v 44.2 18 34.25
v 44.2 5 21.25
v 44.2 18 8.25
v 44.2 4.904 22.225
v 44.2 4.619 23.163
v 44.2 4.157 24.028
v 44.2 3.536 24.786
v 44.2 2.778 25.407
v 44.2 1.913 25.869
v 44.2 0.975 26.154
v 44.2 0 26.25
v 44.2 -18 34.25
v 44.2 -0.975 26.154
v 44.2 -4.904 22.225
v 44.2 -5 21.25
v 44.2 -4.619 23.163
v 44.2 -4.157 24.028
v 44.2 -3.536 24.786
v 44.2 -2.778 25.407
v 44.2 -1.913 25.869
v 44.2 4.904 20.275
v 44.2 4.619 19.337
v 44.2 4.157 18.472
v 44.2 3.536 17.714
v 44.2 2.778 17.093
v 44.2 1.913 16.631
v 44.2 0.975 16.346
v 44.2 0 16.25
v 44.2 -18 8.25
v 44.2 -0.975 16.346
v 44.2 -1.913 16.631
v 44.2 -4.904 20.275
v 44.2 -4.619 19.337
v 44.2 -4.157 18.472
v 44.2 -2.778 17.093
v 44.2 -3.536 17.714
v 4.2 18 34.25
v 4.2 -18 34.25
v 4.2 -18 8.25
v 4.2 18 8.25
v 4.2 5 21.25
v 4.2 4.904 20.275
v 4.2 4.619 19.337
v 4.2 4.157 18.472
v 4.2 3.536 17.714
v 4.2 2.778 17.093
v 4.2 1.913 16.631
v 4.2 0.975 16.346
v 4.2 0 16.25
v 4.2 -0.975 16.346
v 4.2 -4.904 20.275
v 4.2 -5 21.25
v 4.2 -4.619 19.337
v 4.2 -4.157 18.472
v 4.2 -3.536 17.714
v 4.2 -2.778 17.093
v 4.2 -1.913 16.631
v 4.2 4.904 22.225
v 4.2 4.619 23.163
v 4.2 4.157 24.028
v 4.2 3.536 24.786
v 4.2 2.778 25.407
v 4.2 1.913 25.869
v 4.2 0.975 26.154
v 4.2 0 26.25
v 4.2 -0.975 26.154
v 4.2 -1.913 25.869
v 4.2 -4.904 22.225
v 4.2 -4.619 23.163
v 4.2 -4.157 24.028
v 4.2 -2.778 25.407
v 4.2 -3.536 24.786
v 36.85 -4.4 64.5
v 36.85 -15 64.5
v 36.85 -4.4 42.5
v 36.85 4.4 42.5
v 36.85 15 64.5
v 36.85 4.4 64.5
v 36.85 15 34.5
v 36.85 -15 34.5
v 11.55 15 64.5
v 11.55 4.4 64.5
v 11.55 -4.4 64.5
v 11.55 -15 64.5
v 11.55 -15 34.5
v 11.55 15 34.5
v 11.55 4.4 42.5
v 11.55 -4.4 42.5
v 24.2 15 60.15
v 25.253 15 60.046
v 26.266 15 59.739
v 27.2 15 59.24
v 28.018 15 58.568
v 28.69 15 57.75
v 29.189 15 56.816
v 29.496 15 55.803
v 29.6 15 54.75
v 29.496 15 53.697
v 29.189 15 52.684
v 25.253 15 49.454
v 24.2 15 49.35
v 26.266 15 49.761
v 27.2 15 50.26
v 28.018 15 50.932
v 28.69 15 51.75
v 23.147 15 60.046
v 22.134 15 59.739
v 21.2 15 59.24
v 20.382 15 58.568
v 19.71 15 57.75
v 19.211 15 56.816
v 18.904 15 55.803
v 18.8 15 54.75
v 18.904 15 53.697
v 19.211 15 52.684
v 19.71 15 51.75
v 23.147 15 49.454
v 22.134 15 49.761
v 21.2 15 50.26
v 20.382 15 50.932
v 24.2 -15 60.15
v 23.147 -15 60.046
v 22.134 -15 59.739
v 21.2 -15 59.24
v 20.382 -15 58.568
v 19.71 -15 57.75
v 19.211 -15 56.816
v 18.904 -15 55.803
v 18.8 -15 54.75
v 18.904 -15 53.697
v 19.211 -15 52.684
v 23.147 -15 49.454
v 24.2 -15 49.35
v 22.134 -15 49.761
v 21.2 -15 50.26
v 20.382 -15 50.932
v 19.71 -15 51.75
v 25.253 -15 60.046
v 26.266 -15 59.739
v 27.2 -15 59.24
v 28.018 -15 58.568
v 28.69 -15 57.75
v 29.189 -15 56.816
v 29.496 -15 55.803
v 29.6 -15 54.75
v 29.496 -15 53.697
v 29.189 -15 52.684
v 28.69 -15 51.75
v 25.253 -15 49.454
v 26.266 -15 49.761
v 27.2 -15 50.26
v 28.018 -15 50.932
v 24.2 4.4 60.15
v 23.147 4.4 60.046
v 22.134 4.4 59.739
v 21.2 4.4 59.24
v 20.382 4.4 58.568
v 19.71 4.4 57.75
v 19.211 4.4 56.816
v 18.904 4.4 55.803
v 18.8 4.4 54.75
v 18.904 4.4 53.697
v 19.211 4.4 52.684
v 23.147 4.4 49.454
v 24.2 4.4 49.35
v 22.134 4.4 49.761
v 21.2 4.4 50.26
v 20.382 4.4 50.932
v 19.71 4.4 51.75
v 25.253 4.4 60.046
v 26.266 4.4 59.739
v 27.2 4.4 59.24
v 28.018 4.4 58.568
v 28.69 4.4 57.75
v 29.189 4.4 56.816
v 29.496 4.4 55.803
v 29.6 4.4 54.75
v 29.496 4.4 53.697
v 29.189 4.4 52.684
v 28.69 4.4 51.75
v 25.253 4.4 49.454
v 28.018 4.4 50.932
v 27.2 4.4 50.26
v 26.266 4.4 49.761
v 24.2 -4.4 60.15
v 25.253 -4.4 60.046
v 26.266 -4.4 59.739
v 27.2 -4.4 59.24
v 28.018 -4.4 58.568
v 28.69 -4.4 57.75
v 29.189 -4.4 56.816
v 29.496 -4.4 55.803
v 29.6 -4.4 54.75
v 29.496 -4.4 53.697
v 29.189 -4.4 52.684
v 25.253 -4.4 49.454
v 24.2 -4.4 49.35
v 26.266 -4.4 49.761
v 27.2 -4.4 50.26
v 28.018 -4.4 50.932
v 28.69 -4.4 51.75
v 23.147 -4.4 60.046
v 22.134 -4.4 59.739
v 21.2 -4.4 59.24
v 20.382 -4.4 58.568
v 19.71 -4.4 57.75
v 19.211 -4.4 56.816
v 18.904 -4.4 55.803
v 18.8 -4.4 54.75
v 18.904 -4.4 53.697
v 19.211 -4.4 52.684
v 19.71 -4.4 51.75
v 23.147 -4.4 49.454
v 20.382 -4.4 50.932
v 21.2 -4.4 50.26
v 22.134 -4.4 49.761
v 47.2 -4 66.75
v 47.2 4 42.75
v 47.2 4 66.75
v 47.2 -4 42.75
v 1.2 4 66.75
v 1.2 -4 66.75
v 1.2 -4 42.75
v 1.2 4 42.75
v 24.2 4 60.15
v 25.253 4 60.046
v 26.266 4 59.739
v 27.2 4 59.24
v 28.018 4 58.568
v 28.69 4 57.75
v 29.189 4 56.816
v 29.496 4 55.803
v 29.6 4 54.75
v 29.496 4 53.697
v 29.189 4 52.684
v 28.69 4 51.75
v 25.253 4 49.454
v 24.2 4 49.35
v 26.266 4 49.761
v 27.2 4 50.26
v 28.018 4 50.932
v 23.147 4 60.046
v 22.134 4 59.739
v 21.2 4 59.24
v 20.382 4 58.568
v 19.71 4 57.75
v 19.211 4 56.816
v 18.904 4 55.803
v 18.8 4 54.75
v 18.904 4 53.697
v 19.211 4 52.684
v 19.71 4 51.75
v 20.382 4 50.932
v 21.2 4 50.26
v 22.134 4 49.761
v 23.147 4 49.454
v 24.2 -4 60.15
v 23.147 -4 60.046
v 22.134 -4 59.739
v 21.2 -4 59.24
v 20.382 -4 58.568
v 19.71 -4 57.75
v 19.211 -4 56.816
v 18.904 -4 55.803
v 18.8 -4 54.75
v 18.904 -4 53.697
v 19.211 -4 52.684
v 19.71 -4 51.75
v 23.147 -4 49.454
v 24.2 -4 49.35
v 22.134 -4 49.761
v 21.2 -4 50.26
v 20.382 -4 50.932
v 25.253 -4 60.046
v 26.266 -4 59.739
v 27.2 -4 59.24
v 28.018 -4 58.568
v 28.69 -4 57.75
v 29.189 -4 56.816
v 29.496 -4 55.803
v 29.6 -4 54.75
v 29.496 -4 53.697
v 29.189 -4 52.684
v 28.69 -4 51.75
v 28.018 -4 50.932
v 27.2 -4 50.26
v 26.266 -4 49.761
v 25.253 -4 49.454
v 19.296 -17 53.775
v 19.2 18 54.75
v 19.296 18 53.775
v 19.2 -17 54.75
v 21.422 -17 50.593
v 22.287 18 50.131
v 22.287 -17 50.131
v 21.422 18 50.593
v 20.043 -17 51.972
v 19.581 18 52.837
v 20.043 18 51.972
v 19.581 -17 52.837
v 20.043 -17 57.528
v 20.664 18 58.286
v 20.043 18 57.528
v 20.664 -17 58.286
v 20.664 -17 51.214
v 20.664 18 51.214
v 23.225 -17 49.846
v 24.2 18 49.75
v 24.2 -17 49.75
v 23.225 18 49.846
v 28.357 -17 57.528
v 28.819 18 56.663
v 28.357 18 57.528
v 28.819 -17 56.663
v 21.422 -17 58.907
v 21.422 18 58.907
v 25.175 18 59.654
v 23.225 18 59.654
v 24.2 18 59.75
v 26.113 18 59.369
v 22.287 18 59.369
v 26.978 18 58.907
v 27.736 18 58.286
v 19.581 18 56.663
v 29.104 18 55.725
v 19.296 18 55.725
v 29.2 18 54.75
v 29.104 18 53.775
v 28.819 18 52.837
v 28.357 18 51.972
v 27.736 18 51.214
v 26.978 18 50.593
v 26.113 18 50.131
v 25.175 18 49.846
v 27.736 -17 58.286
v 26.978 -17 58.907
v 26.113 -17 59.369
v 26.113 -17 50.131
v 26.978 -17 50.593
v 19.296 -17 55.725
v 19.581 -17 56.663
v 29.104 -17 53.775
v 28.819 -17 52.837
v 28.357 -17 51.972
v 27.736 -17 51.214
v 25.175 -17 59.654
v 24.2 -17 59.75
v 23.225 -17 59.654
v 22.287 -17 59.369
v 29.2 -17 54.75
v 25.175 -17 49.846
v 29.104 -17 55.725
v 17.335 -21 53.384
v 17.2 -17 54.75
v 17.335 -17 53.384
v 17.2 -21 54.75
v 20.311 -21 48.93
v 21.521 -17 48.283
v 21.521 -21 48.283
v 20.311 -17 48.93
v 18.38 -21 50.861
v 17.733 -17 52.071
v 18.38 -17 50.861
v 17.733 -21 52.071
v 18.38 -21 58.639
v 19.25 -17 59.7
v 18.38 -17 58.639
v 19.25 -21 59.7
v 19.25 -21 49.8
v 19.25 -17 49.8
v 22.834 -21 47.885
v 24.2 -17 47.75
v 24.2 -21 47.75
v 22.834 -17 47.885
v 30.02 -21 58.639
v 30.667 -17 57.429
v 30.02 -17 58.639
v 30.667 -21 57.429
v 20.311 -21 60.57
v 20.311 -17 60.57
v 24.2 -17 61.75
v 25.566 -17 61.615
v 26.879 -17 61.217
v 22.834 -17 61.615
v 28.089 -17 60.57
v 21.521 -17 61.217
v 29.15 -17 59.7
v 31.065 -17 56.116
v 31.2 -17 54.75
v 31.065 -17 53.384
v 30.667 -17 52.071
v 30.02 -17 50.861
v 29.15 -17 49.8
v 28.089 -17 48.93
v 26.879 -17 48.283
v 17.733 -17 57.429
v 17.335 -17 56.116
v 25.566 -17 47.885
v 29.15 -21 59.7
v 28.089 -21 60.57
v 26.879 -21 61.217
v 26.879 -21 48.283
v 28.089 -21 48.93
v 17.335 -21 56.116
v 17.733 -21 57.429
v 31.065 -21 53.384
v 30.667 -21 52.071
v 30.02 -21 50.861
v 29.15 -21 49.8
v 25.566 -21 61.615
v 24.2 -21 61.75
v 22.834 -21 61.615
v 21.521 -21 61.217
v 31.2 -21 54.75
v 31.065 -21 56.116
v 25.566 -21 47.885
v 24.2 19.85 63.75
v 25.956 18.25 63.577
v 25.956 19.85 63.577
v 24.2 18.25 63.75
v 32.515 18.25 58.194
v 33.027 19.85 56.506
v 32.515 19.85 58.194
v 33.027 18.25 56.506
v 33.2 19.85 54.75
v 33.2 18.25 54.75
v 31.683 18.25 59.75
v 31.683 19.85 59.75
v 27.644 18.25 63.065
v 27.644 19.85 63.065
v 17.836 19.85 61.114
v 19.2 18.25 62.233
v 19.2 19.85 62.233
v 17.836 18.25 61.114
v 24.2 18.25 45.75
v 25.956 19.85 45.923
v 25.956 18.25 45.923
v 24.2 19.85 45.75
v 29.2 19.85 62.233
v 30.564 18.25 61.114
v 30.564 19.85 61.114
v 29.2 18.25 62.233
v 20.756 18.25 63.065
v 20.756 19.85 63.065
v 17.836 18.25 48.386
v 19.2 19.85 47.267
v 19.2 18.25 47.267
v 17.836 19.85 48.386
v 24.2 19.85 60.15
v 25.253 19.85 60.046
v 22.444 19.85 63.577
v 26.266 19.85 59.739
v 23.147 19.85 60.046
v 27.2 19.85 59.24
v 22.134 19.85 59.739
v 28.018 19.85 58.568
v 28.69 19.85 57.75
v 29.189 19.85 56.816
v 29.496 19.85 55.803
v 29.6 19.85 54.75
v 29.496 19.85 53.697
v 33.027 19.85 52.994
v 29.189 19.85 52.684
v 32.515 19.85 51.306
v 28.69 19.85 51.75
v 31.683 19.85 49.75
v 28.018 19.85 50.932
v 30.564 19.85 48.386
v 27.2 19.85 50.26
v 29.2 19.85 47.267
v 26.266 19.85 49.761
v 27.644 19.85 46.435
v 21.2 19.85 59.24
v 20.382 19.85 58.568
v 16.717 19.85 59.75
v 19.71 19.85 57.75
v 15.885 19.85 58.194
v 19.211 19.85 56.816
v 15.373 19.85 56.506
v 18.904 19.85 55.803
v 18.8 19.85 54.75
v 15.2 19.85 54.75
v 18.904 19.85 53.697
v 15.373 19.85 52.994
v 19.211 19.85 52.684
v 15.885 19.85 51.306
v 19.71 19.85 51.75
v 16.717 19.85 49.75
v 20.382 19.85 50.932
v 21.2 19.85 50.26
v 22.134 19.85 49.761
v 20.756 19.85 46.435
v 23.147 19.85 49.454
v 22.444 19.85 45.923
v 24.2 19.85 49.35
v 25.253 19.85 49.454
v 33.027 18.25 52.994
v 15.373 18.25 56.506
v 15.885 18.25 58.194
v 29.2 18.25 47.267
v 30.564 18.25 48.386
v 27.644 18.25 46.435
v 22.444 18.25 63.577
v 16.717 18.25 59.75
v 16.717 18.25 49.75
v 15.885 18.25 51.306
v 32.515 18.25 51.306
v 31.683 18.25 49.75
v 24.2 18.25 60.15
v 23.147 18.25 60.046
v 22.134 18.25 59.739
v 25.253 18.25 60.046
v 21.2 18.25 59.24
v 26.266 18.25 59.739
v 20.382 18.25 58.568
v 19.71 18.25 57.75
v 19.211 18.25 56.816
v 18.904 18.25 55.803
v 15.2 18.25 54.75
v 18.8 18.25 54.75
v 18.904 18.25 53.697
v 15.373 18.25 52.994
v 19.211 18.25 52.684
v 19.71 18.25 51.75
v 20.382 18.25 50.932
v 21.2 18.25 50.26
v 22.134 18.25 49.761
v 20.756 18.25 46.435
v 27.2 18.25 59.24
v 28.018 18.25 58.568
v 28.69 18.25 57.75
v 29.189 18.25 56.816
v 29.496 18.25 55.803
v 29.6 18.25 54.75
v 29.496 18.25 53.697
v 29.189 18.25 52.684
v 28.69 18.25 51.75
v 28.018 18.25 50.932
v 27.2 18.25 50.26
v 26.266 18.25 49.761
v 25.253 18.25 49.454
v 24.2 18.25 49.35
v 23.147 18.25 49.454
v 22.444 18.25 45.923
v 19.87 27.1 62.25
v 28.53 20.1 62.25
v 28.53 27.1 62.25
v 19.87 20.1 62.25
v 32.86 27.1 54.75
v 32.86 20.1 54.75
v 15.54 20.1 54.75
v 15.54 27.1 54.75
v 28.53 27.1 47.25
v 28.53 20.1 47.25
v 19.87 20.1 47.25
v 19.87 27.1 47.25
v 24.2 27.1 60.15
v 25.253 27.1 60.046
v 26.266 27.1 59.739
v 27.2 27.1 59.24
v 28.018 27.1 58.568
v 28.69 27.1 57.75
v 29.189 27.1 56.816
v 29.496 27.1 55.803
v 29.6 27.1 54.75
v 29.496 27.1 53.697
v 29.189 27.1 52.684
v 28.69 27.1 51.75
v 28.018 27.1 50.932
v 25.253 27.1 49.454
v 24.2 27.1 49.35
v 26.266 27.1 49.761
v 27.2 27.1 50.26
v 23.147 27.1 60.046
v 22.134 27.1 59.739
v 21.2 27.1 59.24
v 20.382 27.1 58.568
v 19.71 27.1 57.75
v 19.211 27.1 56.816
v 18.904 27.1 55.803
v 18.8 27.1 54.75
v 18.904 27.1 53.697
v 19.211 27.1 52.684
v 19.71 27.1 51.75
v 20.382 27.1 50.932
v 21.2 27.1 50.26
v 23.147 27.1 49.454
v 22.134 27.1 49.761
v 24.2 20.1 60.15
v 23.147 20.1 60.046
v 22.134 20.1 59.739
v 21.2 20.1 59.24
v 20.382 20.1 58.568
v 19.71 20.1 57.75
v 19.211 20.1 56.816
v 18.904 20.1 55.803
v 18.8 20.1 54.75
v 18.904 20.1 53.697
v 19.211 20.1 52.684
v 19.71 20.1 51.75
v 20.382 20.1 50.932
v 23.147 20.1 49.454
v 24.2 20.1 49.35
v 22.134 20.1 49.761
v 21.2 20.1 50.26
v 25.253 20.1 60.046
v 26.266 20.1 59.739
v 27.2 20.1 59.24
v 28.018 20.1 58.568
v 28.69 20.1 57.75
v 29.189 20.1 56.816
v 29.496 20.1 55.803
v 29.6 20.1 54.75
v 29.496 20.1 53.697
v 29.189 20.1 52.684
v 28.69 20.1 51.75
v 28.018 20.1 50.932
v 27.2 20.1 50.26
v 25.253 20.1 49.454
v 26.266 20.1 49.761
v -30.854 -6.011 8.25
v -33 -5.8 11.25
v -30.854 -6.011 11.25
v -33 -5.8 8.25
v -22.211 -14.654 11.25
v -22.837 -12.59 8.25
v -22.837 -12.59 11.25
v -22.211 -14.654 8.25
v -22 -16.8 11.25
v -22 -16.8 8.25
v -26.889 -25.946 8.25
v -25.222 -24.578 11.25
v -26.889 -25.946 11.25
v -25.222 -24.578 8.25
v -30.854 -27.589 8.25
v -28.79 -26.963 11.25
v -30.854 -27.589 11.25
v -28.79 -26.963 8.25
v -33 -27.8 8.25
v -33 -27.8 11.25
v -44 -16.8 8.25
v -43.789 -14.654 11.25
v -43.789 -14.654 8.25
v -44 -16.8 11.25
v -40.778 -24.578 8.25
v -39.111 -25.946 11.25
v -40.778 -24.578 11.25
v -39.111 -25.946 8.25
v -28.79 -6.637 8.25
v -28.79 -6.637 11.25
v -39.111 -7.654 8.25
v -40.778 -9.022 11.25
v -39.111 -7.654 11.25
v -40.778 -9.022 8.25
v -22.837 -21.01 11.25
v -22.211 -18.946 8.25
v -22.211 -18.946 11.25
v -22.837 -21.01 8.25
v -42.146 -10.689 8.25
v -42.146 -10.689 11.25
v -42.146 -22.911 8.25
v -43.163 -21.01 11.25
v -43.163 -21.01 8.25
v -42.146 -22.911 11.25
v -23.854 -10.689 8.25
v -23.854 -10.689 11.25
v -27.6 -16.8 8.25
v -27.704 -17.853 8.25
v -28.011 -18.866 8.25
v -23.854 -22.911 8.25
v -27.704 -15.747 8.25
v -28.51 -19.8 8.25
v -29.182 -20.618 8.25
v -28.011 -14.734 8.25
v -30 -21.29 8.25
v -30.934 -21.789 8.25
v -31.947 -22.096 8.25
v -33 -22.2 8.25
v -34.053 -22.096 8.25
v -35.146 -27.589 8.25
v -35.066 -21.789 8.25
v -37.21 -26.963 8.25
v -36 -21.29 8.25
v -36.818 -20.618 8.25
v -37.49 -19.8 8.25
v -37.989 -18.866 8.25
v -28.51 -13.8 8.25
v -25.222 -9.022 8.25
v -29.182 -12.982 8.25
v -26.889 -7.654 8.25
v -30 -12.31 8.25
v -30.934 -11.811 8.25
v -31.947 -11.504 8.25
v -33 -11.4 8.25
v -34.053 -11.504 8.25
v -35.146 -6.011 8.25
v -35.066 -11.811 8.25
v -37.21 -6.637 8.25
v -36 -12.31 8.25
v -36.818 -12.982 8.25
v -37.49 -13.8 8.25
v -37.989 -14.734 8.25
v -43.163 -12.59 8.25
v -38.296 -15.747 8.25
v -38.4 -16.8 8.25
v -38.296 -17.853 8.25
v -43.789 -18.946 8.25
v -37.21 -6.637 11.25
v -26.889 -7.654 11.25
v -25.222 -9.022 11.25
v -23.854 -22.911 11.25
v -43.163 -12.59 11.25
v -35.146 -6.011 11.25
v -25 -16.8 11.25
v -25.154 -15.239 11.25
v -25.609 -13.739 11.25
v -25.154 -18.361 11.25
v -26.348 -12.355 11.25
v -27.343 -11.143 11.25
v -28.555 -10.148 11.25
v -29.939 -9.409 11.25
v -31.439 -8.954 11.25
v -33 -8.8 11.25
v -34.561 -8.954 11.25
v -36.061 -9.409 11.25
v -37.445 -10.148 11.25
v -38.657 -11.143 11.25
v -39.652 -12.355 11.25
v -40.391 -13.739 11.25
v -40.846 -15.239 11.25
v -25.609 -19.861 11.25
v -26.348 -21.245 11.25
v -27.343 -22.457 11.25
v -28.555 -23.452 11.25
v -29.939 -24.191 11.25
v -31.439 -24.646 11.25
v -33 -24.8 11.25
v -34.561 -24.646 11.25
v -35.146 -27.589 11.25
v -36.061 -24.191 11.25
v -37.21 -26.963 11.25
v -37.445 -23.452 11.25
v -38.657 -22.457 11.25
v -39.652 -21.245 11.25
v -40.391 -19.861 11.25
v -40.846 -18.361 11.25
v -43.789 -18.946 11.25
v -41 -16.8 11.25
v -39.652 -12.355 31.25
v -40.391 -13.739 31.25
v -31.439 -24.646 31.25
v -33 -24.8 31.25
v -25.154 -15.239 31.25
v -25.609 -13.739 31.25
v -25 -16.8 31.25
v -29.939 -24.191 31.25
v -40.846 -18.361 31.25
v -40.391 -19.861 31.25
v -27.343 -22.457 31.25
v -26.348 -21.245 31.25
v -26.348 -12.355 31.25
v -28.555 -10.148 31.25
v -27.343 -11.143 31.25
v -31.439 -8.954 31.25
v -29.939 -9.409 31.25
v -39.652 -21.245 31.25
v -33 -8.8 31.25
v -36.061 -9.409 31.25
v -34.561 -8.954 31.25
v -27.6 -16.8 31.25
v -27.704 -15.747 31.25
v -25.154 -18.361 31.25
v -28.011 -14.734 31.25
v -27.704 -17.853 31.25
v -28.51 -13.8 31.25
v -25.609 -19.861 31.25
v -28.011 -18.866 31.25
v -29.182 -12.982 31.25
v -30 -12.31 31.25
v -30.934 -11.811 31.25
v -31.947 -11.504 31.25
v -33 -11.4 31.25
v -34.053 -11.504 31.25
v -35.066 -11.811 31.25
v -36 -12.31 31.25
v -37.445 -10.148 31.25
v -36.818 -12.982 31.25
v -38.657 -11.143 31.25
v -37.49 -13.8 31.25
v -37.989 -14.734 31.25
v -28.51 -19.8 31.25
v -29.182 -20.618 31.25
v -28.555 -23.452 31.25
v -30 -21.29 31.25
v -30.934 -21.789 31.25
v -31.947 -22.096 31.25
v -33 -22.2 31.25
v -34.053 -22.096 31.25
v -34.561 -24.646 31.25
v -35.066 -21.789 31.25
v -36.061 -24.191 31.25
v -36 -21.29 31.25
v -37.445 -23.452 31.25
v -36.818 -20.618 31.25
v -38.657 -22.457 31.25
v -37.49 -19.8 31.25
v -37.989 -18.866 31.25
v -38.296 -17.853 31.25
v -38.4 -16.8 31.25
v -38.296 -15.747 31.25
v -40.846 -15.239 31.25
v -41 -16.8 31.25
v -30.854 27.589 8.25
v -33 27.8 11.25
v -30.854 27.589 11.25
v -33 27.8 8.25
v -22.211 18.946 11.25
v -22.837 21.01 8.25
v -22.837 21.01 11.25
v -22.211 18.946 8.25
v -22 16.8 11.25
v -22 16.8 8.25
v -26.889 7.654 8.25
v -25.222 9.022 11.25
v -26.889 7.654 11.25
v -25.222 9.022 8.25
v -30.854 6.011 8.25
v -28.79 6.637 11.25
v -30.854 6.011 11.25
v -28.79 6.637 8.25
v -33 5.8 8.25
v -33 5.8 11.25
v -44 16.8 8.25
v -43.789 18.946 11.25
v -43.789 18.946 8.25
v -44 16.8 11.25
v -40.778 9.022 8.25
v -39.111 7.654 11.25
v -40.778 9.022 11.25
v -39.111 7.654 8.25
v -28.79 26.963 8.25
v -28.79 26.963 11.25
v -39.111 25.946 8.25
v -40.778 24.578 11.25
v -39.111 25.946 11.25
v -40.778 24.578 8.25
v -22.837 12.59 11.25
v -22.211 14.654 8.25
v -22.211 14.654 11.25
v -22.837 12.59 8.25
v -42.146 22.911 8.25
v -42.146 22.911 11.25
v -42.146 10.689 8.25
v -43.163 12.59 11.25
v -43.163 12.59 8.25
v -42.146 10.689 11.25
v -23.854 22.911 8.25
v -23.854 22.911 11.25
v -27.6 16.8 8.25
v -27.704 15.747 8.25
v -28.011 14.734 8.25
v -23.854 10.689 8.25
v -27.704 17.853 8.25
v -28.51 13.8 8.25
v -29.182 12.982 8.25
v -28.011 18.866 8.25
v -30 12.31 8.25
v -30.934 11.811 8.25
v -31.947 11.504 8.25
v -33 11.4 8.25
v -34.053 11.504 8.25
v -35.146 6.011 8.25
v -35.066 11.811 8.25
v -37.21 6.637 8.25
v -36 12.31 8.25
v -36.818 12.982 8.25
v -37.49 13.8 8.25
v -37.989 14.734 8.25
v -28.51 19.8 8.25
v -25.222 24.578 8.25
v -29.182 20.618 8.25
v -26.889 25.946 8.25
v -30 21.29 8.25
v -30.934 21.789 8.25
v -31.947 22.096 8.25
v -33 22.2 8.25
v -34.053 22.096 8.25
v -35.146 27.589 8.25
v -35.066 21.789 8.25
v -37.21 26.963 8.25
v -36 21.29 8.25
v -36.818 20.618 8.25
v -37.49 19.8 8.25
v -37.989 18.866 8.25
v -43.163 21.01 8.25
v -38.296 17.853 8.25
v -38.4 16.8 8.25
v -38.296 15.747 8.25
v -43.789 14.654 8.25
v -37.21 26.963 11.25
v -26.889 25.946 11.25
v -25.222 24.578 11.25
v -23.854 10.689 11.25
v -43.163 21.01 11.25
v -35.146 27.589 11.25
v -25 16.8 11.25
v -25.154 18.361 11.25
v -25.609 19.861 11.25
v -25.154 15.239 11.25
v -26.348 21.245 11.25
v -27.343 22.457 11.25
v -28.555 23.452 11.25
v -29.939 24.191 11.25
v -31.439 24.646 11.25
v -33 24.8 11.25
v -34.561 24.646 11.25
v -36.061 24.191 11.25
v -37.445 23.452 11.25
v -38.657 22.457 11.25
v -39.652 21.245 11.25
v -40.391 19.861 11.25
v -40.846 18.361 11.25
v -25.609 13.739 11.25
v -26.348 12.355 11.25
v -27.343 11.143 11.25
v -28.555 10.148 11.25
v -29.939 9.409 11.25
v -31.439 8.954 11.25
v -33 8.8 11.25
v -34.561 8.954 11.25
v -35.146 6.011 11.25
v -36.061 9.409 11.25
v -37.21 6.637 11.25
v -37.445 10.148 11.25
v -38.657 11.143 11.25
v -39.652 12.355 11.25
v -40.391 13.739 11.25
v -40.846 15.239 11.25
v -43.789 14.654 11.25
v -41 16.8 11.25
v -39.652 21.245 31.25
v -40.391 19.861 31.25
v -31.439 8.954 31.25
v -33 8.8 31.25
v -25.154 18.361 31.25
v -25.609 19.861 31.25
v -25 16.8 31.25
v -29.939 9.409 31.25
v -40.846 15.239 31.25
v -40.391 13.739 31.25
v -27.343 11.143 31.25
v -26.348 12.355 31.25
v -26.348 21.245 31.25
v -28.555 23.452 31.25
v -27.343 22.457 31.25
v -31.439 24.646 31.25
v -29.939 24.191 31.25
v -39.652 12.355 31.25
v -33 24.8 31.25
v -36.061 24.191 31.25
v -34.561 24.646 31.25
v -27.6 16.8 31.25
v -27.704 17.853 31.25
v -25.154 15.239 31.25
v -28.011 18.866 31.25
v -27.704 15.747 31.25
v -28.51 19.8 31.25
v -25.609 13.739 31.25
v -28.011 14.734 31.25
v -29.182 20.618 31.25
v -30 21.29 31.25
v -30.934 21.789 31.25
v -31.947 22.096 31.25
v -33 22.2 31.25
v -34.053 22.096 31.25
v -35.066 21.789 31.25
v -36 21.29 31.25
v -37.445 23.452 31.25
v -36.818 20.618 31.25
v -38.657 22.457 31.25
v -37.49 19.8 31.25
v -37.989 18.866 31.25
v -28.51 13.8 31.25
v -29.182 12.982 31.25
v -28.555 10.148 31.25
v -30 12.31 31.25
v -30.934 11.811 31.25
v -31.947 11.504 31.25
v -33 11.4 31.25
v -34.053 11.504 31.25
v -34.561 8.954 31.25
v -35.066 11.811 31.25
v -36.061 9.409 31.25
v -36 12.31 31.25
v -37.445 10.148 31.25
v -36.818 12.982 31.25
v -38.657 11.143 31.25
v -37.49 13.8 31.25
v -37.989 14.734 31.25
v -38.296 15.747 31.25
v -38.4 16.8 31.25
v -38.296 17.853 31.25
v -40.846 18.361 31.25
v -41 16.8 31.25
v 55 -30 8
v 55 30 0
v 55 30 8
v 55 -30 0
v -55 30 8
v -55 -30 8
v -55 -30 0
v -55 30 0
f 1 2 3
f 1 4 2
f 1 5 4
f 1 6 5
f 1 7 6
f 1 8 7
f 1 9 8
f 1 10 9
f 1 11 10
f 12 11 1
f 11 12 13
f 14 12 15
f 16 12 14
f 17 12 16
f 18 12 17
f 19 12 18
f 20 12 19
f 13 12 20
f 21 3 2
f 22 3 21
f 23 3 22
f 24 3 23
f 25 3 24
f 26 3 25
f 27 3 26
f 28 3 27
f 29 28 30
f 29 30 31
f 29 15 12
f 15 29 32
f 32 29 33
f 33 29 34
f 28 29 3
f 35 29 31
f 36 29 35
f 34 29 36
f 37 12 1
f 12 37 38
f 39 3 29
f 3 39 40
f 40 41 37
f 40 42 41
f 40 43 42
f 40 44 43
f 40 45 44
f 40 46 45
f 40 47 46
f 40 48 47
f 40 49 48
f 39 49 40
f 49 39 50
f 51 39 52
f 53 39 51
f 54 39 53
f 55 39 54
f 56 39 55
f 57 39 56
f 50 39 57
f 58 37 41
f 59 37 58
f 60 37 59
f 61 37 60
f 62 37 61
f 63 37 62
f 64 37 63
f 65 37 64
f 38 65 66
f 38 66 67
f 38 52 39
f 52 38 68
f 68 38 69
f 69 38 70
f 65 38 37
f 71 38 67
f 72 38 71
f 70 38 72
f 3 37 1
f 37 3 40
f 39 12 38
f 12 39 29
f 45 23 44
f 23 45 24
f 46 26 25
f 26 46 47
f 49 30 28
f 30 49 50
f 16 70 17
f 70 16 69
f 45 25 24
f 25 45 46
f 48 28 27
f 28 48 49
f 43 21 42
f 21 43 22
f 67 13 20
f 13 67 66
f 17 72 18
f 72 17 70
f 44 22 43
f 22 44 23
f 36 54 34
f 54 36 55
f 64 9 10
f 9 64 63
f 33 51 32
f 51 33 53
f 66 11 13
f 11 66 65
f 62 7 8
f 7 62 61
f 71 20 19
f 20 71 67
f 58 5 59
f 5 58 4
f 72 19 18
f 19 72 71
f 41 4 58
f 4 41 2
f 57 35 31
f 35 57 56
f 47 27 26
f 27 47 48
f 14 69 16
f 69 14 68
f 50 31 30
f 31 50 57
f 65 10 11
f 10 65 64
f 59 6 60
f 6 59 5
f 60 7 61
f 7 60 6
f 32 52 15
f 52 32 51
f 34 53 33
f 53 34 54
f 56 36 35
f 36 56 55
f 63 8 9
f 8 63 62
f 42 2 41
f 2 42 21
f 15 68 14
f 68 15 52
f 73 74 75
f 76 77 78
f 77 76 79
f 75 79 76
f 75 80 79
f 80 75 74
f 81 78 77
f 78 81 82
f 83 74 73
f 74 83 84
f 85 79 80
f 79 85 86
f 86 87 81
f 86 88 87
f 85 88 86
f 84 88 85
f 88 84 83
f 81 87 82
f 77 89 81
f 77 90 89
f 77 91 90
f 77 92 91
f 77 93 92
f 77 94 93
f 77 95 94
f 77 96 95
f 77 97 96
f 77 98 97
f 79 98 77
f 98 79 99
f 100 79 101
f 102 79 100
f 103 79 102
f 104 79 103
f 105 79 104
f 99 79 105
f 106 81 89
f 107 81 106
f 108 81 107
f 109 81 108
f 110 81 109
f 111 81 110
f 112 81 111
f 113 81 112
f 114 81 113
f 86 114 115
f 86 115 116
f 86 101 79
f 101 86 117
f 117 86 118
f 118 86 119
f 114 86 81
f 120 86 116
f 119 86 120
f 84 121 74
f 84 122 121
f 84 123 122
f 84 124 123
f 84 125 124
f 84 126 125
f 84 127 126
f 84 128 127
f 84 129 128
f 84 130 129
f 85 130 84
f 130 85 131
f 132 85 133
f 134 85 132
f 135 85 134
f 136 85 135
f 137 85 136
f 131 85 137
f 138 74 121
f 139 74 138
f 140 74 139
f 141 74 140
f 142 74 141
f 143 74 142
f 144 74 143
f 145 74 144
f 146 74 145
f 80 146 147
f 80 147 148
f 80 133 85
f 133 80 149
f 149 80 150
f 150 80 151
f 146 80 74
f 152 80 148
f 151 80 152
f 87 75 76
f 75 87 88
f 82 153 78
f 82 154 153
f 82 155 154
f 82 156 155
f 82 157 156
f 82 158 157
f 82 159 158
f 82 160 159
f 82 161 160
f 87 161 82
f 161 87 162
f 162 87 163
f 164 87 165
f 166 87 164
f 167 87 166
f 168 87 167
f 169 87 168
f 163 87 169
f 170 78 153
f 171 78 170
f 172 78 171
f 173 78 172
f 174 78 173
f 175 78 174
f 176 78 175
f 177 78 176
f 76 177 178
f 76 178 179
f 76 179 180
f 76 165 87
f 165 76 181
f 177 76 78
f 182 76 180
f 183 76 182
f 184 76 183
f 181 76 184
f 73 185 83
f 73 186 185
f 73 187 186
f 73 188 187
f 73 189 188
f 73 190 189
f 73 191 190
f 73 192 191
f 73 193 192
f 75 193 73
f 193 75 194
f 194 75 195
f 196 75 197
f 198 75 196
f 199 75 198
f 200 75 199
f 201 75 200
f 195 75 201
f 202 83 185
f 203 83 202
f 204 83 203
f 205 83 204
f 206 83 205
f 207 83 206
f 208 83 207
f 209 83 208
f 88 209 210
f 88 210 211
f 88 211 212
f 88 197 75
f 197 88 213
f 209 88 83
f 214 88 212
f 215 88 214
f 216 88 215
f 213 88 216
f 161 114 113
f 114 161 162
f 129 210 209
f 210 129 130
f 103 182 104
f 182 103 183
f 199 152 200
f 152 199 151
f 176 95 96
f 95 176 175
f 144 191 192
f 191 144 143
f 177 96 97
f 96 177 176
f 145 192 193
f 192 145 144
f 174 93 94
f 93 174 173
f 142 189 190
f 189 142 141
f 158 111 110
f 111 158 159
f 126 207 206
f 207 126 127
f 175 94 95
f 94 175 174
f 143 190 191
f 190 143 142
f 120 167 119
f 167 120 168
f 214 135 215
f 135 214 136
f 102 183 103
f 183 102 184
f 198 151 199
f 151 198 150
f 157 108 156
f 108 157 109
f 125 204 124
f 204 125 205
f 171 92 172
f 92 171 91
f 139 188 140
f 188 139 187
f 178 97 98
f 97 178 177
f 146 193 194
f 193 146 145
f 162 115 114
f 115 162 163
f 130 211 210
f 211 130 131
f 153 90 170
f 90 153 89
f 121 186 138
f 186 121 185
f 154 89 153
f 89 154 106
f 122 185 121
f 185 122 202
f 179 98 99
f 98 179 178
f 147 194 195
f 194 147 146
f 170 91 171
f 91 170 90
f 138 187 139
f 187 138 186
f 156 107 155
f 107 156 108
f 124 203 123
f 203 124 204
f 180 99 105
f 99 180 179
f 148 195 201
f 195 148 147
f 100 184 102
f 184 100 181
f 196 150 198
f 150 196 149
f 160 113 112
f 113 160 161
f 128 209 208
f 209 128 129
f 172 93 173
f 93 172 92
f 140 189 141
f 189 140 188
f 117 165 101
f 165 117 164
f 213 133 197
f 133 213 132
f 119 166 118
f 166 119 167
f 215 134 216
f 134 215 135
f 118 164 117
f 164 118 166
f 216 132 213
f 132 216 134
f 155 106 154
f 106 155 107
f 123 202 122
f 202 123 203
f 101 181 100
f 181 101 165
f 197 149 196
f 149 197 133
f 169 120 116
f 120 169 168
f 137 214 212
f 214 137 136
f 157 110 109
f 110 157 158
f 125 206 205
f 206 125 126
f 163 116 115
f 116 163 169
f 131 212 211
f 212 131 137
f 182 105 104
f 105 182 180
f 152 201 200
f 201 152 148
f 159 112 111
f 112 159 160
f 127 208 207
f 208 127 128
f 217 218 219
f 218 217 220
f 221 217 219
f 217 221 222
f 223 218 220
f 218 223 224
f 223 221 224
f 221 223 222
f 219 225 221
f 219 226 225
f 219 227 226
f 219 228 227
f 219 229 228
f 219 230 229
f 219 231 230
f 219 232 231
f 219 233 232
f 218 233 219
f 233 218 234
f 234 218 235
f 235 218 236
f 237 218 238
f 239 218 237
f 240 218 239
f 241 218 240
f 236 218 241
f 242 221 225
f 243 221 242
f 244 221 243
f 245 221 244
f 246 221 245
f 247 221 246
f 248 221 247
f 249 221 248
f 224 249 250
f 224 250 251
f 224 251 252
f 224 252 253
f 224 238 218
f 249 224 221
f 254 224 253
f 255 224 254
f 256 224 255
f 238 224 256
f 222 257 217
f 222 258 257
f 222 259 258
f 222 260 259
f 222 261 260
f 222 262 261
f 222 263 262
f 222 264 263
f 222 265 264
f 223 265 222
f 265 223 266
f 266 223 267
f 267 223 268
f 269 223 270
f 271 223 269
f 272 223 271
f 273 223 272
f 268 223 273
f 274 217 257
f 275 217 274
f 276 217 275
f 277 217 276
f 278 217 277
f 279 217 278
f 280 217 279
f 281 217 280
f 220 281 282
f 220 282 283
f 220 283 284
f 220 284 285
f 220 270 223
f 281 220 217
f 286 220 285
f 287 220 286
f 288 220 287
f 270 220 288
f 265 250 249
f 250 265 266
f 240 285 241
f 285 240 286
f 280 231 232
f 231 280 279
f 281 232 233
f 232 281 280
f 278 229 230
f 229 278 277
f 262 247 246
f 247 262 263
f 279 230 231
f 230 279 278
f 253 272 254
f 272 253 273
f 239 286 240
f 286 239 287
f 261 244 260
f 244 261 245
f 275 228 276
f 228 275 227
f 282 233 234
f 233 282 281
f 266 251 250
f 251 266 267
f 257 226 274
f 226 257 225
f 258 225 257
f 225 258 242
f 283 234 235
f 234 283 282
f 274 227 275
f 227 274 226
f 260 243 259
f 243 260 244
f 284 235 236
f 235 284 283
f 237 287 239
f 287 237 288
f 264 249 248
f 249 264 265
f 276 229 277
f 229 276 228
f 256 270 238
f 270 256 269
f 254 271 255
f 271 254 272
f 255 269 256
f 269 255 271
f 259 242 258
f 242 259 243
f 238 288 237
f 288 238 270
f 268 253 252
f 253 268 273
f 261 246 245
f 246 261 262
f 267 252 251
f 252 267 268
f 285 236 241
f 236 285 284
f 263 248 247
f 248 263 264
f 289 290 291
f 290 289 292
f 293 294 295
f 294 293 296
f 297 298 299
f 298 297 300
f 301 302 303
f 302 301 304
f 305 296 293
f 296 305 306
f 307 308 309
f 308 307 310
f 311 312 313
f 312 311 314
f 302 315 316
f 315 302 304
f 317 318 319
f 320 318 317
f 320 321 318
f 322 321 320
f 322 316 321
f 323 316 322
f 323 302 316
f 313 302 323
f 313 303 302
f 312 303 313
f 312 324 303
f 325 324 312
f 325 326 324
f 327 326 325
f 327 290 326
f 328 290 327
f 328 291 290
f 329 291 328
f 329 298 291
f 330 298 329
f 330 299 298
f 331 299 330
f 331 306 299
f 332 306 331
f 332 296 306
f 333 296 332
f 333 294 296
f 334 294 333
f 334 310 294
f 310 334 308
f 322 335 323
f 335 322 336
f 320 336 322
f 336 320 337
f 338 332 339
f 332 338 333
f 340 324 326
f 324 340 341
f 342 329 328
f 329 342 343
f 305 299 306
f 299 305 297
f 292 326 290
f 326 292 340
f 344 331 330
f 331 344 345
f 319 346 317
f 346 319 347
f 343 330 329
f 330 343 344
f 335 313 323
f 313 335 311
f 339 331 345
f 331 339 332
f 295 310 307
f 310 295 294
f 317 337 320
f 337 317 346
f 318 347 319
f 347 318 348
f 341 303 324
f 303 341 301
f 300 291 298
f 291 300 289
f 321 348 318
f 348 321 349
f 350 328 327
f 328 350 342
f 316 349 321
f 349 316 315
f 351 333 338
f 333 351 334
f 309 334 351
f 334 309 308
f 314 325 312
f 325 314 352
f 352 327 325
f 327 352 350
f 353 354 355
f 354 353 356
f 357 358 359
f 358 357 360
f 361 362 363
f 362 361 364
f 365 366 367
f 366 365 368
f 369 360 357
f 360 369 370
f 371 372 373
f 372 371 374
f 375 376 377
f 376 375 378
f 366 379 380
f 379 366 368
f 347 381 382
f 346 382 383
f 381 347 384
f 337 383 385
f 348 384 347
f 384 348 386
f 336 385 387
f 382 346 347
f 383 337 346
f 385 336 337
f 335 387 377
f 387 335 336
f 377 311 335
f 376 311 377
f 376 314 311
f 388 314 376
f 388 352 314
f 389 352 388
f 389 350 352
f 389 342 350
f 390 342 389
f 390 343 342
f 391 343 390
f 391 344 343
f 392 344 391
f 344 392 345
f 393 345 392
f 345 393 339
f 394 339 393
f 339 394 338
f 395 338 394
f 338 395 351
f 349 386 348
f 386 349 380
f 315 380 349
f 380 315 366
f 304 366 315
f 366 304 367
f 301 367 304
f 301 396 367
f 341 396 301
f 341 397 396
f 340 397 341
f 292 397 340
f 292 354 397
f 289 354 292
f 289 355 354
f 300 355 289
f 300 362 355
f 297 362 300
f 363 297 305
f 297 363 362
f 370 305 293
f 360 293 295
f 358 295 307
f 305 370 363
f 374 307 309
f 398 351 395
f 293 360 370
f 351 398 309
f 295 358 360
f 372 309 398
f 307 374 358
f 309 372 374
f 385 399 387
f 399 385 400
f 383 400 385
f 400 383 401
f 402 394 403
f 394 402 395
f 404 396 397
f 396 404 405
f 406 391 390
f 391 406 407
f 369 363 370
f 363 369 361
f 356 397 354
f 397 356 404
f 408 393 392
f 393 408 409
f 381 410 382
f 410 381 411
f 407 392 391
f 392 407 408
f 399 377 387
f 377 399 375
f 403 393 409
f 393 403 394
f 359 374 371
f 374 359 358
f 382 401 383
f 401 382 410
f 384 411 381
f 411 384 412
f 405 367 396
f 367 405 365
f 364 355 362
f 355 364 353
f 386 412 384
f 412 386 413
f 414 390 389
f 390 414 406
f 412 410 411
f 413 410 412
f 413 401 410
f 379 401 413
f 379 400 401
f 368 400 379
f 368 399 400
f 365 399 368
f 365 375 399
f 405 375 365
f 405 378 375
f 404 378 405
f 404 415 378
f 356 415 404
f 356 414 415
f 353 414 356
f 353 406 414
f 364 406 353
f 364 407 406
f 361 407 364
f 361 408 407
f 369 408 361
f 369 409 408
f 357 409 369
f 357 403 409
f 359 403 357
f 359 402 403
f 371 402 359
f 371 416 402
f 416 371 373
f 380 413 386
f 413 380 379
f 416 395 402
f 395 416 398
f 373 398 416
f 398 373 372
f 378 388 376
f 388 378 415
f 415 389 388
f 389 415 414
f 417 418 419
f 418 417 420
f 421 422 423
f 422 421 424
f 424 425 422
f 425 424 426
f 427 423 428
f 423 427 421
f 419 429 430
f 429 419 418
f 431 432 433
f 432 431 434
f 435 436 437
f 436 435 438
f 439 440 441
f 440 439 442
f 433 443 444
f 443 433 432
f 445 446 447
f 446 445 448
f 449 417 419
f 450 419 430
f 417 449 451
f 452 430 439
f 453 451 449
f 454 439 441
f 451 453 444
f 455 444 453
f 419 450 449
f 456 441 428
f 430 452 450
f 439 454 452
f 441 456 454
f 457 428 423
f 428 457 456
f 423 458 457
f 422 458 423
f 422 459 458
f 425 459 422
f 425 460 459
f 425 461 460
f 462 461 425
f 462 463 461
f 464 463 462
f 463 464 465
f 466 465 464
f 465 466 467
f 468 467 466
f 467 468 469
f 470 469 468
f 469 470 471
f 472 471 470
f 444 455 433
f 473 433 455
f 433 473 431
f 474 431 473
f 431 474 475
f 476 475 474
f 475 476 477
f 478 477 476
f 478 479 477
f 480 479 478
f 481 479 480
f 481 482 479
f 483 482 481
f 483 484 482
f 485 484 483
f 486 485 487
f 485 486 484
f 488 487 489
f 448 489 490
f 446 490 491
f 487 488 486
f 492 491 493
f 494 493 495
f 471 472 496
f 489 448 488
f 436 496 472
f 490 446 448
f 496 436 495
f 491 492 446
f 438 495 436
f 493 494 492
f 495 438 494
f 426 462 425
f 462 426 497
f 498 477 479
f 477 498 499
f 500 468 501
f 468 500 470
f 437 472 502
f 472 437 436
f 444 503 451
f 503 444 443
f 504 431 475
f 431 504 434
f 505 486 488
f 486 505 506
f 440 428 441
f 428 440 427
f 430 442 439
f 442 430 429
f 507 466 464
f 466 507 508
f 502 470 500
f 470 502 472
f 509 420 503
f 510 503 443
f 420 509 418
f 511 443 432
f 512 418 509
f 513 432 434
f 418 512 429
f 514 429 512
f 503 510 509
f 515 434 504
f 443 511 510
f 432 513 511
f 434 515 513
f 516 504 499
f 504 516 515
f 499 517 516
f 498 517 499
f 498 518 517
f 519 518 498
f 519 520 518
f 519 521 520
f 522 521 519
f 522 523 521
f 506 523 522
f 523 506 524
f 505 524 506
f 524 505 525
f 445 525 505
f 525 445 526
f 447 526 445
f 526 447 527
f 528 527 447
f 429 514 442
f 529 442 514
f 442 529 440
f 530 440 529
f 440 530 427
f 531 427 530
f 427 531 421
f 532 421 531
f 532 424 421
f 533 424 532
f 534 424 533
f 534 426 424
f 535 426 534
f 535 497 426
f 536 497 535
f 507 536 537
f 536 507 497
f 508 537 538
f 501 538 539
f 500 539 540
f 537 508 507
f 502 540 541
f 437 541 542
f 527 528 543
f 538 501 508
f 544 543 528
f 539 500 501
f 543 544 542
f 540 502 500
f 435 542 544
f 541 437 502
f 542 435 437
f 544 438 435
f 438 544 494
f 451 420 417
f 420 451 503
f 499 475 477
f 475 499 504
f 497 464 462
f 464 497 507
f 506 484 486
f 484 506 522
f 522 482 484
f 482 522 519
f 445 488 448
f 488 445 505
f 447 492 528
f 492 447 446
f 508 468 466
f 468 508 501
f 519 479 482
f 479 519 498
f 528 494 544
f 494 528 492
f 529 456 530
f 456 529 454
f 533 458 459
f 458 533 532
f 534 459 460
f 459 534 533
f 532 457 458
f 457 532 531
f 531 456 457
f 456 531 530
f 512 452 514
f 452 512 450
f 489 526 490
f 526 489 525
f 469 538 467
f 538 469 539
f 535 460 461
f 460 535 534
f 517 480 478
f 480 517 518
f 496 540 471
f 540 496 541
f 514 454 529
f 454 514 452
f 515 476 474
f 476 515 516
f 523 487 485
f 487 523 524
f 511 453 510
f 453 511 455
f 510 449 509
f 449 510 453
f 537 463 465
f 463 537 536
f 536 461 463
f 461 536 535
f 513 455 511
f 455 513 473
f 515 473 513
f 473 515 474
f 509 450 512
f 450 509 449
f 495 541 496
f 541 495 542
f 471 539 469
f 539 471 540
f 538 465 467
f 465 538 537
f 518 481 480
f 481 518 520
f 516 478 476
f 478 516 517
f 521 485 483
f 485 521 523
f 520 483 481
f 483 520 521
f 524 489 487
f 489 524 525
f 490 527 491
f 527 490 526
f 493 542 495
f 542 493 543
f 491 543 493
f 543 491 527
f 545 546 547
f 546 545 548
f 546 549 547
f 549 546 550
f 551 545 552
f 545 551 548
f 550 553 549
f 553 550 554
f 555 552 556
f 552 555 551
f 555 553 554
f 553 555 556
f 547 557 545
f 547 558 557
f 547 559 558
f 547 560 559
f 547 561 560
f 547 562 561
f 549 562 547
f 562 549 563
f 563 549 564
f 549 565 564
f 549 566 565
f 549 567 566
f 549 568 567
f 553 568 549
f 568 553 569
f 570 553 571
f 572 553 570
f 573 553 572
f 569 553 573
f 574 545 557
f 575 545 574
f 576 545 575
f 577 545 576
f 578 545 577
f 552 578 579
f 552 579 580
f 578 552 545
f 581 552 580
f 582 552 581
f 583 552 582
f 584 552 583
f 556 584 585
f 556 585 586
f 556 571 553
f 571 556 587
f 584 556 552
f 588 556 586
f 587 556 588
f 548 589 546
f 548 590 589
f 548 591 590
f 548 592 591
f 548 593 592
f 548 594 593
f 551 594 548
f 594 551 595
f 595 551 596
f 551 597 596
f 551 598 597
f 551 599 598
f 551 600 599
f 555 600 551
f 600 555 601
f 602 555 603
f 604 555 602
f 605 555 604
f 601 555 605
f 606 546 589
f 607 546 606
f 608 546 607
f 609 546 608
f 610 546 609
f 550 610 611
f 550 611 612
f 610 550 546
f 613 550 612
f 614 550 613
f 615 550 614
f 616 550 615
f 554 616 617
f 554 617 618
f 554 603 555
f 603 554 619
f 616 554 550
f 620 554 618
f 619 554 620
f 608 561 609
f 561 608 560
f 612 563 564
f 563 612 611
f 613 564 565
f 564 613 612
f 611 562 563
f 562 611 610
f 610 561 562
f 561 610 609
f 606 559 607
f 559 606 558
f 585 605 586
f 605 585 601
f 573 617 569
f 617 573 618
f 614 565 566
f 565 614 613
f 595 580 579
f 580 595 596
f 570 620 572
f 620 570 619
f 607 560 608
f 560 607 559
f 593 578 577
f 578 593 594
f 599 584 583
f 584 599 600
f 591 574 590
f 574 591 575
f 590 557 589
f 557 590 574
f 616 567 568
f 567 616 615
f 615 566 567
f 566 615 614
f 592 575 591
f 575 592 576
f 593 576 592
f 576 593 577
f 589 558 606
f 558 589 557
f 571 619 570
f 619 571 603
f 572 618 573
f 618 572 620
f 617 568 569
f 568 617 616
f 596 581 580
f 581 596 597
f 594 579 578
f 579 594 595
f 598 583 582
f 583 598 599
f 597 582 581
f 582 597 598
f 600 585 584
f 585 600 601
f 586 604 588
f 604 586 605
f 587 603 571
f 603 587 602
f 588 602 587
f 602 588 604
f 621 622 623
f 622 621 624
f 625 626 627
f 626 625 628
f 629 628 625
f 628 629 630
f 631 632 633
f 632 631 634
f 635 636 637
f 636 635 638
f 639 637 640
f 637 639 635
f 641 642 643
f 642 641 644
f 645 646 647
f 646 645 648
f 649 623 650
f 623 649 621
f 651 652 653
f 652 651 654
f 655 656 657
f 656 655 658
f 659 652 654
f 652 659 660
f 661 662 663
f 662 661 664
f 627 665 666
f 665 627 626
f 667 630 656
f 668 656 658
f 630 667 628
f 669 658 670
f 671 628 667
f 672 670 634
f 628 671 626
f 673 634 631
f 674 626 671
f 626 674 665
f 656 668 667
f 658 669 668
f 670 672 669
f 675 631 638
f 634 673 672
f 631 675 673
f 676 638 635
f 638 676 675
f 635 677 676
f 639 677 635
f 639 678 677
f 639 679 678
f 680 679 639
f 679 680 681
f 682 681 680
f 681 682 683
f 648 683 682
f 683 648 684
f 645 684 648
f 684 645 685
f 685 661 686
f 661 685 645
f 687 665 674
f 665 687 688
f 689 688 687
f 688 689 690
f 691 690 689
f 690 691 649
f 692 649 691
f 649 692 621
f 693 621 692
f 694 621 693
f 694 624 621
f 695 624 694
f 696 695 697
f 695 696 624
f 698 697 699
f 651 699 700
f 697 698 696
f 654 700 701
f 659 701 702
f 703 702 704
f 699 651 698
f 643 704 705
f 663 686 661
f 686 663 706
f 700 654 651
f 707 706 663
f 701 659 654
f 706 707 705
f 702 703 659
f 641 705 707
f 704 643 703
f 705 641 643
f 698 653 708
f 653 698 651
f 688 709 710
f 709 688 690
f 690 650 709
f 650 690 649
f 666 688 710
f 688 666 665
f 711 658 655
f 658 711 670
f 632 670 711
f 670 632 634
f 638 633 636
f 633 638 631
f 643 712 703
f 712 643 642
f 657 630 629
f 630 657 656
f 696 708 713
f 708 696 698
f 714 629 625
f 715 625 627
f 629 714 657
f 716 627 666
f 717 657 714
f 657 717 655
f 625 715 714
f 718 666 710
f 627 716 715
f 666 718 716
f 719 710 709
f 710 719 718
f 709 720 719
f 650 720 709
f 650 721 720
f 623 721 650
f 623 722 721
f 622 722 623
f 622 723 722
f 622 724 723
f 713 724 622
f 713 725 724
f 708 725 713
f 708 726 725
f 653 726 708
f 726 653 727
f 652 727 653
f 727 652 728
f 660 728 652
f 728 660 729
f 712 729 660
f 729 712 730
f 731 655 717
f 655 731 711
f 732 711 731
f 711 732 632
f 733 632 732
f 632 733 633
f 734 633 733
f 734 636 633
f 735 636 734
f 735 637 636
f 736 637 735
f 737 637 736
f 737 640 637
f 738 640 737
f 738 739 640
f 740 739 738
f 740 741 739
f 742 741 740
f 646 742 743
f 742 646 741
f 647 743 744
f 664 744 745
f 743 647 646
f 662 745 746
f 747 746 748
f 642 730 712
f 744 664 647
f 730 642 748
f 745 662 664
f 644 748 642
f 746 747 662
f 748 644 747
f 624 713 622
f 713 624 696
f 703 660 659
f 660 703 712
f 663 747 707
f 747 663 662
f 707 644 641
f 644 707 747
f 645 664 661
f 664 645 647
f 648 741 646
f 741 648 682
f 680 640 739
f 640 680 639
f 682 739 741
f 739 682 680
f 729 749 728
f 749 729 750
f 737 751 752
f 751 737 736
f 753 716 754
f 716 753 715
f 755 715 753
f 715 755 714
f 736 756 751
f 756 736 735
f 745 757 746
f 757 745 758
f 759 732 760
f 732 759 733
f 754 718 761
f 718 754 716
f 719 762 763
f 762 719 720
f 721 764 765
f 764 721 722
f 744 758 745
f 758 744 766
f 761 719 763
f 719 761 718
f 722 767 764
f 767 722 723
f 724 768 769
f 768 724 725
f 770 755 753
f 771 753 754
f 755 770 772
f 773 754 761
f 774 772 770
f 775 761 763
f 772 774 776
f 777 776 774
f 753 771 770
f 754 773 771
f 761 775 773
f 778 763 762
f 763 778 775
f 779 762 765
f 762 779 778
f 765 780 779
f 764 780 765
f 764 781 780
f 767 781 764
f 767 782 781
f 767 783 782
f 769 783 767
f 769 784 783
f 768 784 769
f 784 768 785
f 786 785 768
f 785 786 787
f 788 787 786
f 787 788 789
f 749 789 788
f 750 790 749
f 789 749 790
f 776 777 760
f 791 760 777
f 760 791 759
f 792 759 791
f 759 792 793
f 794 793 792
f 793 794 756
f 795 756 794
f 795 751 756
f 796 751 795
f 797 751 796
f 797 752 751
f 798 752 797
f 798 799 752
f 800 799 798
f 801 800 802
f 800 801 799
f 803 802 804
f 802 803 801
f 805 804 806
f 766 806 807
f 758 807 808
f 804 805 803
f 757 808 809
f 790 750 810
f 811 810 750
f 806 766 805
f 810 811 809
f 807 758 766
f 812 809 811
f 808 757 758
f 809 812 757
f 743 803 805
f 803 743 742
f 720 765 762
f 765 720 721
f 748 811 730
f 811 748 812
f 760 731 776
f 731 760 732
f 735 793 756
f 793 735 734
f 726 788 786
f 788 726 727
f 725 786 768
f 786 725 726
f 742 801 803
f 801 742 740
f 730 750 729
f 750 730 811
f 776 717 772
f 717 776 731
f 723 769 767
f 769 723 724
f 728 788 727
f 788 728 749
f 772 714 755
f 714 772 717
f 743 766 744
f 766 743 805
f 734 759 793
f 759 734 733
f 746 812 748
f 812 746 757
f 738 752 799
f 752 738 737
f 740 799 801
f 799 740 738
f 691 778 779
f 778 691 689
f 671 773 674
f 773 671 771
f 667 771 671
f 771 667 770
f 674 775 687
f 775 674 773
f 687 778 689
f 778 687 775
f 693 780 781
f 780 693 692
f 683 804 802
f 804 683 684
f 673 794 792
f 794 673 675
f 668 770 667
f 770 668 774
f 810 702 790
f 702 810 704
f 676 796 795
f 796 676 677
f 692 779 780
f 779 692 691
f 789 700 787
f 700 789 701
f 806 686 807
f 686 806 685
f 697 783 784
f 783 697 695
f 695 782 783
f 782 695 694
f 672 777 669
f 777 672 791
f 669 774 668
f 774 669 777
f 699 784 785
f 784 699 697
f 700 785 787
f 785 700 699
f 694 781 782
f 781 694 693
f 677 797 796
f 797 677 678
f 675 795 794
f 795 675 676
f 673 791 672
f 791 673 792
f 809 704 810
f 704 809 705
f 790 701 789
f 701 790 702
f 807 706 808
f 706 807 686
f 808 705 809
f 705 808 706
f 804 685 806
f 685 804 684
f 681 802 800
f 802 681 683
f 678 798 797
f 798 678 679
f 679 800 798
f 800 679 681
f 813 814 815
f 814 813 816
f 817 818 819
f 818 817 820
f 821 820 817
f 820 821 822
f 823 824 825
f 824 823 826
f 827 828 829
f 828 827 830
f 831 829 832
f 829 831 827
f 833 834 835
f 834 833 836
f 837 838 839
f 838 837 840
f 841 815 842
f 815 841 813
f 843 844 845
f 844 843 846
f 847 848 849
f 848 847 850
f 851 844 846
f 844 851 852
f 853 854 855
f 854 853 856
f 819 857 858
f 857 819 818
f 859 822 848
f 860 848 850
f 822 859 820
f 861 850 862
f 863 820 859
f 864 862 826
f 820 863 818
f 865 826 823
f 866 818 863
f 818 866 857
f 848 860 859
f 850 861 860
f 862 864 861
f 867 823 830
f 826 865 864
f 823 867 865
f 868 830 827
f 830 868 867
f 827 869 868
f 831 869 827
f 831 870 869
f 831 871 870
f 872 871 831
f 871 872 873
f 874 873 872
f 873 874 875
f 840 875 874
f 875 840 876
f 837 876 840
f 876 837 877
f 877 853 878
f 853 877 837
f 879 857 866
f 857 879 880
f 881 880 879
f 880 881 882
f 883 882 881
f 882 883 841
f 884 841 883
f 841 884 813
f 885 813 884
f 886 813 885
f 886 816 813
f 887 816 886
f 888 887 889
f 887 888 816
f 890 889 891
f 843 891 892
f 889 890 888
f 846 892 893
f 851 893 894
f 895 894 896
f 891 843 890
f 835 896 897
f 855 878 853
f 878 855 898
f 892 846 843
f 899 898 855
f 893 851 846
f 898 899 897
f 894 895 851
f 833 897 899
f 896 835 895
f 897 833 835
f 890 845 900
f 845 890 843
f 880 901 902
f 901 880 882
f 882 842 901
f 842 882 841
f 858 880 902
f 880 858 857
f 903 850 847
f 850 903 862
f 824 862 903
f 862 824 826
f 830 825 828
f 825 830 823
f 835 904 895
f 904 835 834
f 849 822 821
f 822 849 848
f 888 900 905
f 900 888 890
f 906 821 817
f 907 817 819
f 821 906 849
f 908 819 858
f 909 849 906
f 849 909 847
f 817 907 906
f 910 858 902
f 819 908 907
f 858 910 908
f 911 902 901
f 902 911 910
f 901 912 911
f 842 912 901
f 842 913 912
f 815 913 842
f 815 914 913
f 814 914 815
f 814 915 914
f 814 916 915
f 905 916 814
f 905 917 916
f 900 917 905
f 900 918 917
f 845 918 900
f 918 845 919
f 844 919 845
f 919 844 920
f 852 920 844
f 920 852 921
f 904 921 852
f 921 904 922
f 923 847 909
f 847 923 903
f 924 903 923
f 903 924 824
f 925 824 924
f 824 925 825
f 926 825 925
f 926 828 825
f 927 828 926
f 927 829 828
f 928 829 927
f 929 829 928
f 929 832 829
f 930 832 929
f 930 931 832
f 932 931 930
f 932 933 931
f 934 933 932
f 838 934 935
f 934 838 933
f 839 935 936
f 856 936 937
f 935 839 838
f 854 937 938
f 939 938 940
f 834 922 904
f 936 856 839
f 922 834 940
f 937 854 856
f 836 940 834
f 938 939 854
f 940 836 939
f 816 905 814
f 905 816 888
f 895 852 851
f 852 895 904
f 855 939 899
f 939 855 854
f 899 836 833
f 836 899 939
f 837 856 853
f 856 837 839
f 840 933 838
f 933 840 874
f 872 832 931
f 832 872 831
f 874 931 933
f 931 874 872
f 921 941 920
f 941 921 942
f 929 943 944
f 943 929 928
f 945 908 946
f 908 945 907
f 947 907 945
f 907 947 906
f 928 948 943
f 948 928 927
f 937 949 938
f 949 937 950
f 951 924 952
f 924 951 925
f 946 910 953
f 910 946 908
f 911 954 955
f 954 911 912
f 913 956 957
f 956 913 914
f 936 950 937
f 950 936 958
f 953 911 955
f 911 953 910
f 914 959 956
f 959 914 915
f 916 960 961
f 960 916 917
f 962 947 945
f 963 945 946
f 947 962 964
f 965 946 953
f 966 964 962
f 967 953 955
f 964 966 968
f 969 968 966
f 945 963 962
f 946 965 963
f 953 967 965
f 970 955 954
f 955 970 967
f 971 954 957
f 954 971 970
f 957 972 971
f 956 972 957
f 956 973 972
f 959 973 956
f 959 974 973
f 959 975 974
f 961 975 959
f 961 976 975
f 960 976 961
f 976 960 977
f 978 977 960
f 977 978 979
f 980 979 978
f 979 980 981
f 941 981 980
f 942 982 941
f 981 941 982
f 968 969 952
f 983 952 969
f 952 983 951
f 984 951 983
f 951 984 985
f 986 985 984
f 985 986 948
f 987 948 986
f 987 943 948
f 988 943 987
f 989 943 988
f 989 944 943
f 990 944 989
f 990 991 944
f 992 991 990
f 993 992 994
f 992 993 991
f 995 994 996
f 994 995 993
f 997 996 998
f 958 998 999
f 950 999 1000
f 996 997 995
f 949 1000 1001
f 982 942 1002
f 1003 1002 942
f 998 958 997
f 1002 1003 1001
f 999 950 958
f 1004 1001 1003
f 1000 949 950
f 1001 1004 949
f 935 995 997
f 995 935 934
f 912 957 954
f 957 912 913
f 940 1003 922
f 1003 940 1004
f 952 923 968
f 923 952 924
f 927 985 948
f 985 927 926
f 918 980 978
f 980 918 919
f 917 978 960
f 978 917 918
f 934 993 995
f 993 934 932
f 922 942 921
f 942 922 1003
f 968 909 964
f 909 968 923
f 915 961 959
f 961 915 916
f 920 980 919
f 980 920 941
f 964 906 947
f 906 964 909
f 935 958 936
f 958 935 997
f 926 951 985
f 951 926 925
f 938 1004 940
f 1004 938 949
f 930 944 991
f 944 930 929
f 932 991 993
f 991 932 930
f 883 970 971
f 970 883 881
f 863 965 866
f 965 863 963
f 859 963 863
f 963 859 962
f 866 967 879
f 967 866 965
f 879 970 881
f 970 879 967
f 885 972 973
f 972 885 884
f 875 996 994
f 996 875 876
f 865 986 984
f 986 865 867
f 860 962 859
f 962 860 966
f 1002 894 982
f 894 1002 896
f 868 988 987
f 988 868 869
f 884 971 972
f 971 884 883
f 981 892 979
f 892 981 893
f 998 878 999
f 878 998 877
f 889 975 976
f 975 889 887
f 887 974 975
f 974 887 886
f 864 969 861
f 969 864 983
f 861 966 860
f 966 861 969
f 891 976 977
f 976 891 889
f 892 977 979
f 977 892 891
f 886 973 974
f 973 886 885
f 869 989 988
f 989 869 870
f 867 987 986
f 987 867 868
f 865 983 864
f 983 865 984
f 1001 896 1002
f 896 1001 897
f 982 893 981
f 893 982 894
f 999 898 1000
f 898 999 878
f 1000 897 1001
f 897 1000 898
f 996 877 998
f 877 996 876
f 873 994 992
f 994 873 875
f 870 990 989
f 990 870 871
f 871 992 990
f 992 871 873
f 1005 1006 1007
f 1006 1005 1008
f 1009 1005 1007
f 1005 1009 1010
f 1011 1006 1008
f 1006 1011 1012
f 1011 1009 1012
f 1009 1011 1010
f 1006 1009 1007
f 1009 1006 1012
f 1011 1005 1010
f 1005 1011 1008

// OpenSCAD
$fn = 32;

// ------------------------------------------------------------------------
// Indexing jig: plate 110 x 60 mm, pin d10
// Every part is its own module, assembly() places every instance.
// ------------------------------------------------------------------------

// --- part 1 ---
module jig_plate() {
  difference() {
    translate([-55, -30, 0]) cube([110, 60, 8]);
  }
}

// --- part 2 ---
module locator_block() {
  difference() {
    translate([-20, -18, 0]) cube([40, 36, 26]);
    translate([0, 0, 13]) rotate([0, 90, 0]) cylinder(h = 42, d = 10, center = true);
  }
}

// --- part 3 ---
module index_fork() {
  difference() {
    translate([-12.65, -15, 0]) cube([25.3, 30, 30]);
    translate([-13.65, -4.4, 8]) cube([27.3, 8.8, 23]);
    translate([0, 0, 20.25]) rotate([90, 0, 0]) cylinder(h = 32, d = 10.8, center = true);
  }
}

// --- part 4 ---
module index_arm() {
  difference() {
    translate([-23, -4, 0]) cube([46, 8, 24]);
    translate([0, 0, 12]) rotate([90, 0, 0]) cylinder(h = 10, d = 10.8, center = true);
  }
}

// --- part 5 ---
module index_pin() {
  rotate([0, 90, 0]) cylinder(h = 36, d = 10, center = true);
  translate([-21, 0, 0]) rotate([0, 90, 0]) cylinder(h = 4, d = 14);
}

// --- part 6 ---
module pin_washer() {
  difference() {
      translate([0, 0, 0]) cylinder(h = 1.6, d = 18);
      translate([0, 0, -1]) cylinder(h = 3.6, d = 10.8);
    }
}

// --- part 7 ---
module lock_nut() {
  difference() {
    linear_extrude(height = 7) polygon(points = [[8.66, 0], [4.33, 7.5], [-4.33, 7.5], [-8.66, 0], [-4.33, -7.5], [4.33, -7.5]]);
    translate([0, 0, -1]) cylinder(h = 9, d = 10.8);
  }
}

// --- part 8 ---
module guide_bush_a() {
  difference() {
    union() {
      cylinder(h = 3, d = 22);
      translate([0, 0, 3]) cylinder(h = 20, d = 16);
    }
    translate([0, 0, -1]) cylinder(h = 25, d = 10.8);
  }
}

// --- part 9 ---
module guide_bush_b() {
  difference() {
    union() {
      cylinder(h = 3, d = 22);
      translate([0, 0, 3]) cylinder(h = 20, d = 16);
    }
    translate([0, 0, -1]) cylinder(h = 25, d = 10.8);
  }
}

// --- assembly ---
module assembly() {
  color([0.80, 0.24, 0.20]) translate([0, 0, 0]) rotate([0, 0, 0]) jig_plate();
  color([0.20, 0.45, 0.75]) translate([24.2, 0, 8.25]) rotate([0, 0, 0]) locator_block();
  color([0.25, 0.62, 0.32]) translate([24.2, 0, 34.5]) rotate([0, 0, 0]) index_fork();
  color([0.92, 0.70, 0.18]) translate([24.2, 0, 42.75]) rotate([0, 0, 0]) index_arm();
  color([0.58, 0.35, 0.70]) translate([24.2, 0, 54.75]) rotate([0, 0, 90]) index_pin();
  color([0.16, 0.66, 0.66]) translate([24.2, 19.85, 54.75]) rotate([90, 0, 0]) pin_washer();
  color([0.85, 0.48, 0.18]) translate([24.2, 27.1, 54.75]) rotate([90, 0, 0]) lock_nut();
  color([0.55, 0.60, 0.65]) translate([-33, -16.8, 8.25]) rotate([0, 0, 0]) guide_bush_a();
  color([0.75, 0.30, 0.55]) translate([-33, 16.8, 8.25]) rotate([0, 0, 0]) guide_bush_b();
}

assembly();
